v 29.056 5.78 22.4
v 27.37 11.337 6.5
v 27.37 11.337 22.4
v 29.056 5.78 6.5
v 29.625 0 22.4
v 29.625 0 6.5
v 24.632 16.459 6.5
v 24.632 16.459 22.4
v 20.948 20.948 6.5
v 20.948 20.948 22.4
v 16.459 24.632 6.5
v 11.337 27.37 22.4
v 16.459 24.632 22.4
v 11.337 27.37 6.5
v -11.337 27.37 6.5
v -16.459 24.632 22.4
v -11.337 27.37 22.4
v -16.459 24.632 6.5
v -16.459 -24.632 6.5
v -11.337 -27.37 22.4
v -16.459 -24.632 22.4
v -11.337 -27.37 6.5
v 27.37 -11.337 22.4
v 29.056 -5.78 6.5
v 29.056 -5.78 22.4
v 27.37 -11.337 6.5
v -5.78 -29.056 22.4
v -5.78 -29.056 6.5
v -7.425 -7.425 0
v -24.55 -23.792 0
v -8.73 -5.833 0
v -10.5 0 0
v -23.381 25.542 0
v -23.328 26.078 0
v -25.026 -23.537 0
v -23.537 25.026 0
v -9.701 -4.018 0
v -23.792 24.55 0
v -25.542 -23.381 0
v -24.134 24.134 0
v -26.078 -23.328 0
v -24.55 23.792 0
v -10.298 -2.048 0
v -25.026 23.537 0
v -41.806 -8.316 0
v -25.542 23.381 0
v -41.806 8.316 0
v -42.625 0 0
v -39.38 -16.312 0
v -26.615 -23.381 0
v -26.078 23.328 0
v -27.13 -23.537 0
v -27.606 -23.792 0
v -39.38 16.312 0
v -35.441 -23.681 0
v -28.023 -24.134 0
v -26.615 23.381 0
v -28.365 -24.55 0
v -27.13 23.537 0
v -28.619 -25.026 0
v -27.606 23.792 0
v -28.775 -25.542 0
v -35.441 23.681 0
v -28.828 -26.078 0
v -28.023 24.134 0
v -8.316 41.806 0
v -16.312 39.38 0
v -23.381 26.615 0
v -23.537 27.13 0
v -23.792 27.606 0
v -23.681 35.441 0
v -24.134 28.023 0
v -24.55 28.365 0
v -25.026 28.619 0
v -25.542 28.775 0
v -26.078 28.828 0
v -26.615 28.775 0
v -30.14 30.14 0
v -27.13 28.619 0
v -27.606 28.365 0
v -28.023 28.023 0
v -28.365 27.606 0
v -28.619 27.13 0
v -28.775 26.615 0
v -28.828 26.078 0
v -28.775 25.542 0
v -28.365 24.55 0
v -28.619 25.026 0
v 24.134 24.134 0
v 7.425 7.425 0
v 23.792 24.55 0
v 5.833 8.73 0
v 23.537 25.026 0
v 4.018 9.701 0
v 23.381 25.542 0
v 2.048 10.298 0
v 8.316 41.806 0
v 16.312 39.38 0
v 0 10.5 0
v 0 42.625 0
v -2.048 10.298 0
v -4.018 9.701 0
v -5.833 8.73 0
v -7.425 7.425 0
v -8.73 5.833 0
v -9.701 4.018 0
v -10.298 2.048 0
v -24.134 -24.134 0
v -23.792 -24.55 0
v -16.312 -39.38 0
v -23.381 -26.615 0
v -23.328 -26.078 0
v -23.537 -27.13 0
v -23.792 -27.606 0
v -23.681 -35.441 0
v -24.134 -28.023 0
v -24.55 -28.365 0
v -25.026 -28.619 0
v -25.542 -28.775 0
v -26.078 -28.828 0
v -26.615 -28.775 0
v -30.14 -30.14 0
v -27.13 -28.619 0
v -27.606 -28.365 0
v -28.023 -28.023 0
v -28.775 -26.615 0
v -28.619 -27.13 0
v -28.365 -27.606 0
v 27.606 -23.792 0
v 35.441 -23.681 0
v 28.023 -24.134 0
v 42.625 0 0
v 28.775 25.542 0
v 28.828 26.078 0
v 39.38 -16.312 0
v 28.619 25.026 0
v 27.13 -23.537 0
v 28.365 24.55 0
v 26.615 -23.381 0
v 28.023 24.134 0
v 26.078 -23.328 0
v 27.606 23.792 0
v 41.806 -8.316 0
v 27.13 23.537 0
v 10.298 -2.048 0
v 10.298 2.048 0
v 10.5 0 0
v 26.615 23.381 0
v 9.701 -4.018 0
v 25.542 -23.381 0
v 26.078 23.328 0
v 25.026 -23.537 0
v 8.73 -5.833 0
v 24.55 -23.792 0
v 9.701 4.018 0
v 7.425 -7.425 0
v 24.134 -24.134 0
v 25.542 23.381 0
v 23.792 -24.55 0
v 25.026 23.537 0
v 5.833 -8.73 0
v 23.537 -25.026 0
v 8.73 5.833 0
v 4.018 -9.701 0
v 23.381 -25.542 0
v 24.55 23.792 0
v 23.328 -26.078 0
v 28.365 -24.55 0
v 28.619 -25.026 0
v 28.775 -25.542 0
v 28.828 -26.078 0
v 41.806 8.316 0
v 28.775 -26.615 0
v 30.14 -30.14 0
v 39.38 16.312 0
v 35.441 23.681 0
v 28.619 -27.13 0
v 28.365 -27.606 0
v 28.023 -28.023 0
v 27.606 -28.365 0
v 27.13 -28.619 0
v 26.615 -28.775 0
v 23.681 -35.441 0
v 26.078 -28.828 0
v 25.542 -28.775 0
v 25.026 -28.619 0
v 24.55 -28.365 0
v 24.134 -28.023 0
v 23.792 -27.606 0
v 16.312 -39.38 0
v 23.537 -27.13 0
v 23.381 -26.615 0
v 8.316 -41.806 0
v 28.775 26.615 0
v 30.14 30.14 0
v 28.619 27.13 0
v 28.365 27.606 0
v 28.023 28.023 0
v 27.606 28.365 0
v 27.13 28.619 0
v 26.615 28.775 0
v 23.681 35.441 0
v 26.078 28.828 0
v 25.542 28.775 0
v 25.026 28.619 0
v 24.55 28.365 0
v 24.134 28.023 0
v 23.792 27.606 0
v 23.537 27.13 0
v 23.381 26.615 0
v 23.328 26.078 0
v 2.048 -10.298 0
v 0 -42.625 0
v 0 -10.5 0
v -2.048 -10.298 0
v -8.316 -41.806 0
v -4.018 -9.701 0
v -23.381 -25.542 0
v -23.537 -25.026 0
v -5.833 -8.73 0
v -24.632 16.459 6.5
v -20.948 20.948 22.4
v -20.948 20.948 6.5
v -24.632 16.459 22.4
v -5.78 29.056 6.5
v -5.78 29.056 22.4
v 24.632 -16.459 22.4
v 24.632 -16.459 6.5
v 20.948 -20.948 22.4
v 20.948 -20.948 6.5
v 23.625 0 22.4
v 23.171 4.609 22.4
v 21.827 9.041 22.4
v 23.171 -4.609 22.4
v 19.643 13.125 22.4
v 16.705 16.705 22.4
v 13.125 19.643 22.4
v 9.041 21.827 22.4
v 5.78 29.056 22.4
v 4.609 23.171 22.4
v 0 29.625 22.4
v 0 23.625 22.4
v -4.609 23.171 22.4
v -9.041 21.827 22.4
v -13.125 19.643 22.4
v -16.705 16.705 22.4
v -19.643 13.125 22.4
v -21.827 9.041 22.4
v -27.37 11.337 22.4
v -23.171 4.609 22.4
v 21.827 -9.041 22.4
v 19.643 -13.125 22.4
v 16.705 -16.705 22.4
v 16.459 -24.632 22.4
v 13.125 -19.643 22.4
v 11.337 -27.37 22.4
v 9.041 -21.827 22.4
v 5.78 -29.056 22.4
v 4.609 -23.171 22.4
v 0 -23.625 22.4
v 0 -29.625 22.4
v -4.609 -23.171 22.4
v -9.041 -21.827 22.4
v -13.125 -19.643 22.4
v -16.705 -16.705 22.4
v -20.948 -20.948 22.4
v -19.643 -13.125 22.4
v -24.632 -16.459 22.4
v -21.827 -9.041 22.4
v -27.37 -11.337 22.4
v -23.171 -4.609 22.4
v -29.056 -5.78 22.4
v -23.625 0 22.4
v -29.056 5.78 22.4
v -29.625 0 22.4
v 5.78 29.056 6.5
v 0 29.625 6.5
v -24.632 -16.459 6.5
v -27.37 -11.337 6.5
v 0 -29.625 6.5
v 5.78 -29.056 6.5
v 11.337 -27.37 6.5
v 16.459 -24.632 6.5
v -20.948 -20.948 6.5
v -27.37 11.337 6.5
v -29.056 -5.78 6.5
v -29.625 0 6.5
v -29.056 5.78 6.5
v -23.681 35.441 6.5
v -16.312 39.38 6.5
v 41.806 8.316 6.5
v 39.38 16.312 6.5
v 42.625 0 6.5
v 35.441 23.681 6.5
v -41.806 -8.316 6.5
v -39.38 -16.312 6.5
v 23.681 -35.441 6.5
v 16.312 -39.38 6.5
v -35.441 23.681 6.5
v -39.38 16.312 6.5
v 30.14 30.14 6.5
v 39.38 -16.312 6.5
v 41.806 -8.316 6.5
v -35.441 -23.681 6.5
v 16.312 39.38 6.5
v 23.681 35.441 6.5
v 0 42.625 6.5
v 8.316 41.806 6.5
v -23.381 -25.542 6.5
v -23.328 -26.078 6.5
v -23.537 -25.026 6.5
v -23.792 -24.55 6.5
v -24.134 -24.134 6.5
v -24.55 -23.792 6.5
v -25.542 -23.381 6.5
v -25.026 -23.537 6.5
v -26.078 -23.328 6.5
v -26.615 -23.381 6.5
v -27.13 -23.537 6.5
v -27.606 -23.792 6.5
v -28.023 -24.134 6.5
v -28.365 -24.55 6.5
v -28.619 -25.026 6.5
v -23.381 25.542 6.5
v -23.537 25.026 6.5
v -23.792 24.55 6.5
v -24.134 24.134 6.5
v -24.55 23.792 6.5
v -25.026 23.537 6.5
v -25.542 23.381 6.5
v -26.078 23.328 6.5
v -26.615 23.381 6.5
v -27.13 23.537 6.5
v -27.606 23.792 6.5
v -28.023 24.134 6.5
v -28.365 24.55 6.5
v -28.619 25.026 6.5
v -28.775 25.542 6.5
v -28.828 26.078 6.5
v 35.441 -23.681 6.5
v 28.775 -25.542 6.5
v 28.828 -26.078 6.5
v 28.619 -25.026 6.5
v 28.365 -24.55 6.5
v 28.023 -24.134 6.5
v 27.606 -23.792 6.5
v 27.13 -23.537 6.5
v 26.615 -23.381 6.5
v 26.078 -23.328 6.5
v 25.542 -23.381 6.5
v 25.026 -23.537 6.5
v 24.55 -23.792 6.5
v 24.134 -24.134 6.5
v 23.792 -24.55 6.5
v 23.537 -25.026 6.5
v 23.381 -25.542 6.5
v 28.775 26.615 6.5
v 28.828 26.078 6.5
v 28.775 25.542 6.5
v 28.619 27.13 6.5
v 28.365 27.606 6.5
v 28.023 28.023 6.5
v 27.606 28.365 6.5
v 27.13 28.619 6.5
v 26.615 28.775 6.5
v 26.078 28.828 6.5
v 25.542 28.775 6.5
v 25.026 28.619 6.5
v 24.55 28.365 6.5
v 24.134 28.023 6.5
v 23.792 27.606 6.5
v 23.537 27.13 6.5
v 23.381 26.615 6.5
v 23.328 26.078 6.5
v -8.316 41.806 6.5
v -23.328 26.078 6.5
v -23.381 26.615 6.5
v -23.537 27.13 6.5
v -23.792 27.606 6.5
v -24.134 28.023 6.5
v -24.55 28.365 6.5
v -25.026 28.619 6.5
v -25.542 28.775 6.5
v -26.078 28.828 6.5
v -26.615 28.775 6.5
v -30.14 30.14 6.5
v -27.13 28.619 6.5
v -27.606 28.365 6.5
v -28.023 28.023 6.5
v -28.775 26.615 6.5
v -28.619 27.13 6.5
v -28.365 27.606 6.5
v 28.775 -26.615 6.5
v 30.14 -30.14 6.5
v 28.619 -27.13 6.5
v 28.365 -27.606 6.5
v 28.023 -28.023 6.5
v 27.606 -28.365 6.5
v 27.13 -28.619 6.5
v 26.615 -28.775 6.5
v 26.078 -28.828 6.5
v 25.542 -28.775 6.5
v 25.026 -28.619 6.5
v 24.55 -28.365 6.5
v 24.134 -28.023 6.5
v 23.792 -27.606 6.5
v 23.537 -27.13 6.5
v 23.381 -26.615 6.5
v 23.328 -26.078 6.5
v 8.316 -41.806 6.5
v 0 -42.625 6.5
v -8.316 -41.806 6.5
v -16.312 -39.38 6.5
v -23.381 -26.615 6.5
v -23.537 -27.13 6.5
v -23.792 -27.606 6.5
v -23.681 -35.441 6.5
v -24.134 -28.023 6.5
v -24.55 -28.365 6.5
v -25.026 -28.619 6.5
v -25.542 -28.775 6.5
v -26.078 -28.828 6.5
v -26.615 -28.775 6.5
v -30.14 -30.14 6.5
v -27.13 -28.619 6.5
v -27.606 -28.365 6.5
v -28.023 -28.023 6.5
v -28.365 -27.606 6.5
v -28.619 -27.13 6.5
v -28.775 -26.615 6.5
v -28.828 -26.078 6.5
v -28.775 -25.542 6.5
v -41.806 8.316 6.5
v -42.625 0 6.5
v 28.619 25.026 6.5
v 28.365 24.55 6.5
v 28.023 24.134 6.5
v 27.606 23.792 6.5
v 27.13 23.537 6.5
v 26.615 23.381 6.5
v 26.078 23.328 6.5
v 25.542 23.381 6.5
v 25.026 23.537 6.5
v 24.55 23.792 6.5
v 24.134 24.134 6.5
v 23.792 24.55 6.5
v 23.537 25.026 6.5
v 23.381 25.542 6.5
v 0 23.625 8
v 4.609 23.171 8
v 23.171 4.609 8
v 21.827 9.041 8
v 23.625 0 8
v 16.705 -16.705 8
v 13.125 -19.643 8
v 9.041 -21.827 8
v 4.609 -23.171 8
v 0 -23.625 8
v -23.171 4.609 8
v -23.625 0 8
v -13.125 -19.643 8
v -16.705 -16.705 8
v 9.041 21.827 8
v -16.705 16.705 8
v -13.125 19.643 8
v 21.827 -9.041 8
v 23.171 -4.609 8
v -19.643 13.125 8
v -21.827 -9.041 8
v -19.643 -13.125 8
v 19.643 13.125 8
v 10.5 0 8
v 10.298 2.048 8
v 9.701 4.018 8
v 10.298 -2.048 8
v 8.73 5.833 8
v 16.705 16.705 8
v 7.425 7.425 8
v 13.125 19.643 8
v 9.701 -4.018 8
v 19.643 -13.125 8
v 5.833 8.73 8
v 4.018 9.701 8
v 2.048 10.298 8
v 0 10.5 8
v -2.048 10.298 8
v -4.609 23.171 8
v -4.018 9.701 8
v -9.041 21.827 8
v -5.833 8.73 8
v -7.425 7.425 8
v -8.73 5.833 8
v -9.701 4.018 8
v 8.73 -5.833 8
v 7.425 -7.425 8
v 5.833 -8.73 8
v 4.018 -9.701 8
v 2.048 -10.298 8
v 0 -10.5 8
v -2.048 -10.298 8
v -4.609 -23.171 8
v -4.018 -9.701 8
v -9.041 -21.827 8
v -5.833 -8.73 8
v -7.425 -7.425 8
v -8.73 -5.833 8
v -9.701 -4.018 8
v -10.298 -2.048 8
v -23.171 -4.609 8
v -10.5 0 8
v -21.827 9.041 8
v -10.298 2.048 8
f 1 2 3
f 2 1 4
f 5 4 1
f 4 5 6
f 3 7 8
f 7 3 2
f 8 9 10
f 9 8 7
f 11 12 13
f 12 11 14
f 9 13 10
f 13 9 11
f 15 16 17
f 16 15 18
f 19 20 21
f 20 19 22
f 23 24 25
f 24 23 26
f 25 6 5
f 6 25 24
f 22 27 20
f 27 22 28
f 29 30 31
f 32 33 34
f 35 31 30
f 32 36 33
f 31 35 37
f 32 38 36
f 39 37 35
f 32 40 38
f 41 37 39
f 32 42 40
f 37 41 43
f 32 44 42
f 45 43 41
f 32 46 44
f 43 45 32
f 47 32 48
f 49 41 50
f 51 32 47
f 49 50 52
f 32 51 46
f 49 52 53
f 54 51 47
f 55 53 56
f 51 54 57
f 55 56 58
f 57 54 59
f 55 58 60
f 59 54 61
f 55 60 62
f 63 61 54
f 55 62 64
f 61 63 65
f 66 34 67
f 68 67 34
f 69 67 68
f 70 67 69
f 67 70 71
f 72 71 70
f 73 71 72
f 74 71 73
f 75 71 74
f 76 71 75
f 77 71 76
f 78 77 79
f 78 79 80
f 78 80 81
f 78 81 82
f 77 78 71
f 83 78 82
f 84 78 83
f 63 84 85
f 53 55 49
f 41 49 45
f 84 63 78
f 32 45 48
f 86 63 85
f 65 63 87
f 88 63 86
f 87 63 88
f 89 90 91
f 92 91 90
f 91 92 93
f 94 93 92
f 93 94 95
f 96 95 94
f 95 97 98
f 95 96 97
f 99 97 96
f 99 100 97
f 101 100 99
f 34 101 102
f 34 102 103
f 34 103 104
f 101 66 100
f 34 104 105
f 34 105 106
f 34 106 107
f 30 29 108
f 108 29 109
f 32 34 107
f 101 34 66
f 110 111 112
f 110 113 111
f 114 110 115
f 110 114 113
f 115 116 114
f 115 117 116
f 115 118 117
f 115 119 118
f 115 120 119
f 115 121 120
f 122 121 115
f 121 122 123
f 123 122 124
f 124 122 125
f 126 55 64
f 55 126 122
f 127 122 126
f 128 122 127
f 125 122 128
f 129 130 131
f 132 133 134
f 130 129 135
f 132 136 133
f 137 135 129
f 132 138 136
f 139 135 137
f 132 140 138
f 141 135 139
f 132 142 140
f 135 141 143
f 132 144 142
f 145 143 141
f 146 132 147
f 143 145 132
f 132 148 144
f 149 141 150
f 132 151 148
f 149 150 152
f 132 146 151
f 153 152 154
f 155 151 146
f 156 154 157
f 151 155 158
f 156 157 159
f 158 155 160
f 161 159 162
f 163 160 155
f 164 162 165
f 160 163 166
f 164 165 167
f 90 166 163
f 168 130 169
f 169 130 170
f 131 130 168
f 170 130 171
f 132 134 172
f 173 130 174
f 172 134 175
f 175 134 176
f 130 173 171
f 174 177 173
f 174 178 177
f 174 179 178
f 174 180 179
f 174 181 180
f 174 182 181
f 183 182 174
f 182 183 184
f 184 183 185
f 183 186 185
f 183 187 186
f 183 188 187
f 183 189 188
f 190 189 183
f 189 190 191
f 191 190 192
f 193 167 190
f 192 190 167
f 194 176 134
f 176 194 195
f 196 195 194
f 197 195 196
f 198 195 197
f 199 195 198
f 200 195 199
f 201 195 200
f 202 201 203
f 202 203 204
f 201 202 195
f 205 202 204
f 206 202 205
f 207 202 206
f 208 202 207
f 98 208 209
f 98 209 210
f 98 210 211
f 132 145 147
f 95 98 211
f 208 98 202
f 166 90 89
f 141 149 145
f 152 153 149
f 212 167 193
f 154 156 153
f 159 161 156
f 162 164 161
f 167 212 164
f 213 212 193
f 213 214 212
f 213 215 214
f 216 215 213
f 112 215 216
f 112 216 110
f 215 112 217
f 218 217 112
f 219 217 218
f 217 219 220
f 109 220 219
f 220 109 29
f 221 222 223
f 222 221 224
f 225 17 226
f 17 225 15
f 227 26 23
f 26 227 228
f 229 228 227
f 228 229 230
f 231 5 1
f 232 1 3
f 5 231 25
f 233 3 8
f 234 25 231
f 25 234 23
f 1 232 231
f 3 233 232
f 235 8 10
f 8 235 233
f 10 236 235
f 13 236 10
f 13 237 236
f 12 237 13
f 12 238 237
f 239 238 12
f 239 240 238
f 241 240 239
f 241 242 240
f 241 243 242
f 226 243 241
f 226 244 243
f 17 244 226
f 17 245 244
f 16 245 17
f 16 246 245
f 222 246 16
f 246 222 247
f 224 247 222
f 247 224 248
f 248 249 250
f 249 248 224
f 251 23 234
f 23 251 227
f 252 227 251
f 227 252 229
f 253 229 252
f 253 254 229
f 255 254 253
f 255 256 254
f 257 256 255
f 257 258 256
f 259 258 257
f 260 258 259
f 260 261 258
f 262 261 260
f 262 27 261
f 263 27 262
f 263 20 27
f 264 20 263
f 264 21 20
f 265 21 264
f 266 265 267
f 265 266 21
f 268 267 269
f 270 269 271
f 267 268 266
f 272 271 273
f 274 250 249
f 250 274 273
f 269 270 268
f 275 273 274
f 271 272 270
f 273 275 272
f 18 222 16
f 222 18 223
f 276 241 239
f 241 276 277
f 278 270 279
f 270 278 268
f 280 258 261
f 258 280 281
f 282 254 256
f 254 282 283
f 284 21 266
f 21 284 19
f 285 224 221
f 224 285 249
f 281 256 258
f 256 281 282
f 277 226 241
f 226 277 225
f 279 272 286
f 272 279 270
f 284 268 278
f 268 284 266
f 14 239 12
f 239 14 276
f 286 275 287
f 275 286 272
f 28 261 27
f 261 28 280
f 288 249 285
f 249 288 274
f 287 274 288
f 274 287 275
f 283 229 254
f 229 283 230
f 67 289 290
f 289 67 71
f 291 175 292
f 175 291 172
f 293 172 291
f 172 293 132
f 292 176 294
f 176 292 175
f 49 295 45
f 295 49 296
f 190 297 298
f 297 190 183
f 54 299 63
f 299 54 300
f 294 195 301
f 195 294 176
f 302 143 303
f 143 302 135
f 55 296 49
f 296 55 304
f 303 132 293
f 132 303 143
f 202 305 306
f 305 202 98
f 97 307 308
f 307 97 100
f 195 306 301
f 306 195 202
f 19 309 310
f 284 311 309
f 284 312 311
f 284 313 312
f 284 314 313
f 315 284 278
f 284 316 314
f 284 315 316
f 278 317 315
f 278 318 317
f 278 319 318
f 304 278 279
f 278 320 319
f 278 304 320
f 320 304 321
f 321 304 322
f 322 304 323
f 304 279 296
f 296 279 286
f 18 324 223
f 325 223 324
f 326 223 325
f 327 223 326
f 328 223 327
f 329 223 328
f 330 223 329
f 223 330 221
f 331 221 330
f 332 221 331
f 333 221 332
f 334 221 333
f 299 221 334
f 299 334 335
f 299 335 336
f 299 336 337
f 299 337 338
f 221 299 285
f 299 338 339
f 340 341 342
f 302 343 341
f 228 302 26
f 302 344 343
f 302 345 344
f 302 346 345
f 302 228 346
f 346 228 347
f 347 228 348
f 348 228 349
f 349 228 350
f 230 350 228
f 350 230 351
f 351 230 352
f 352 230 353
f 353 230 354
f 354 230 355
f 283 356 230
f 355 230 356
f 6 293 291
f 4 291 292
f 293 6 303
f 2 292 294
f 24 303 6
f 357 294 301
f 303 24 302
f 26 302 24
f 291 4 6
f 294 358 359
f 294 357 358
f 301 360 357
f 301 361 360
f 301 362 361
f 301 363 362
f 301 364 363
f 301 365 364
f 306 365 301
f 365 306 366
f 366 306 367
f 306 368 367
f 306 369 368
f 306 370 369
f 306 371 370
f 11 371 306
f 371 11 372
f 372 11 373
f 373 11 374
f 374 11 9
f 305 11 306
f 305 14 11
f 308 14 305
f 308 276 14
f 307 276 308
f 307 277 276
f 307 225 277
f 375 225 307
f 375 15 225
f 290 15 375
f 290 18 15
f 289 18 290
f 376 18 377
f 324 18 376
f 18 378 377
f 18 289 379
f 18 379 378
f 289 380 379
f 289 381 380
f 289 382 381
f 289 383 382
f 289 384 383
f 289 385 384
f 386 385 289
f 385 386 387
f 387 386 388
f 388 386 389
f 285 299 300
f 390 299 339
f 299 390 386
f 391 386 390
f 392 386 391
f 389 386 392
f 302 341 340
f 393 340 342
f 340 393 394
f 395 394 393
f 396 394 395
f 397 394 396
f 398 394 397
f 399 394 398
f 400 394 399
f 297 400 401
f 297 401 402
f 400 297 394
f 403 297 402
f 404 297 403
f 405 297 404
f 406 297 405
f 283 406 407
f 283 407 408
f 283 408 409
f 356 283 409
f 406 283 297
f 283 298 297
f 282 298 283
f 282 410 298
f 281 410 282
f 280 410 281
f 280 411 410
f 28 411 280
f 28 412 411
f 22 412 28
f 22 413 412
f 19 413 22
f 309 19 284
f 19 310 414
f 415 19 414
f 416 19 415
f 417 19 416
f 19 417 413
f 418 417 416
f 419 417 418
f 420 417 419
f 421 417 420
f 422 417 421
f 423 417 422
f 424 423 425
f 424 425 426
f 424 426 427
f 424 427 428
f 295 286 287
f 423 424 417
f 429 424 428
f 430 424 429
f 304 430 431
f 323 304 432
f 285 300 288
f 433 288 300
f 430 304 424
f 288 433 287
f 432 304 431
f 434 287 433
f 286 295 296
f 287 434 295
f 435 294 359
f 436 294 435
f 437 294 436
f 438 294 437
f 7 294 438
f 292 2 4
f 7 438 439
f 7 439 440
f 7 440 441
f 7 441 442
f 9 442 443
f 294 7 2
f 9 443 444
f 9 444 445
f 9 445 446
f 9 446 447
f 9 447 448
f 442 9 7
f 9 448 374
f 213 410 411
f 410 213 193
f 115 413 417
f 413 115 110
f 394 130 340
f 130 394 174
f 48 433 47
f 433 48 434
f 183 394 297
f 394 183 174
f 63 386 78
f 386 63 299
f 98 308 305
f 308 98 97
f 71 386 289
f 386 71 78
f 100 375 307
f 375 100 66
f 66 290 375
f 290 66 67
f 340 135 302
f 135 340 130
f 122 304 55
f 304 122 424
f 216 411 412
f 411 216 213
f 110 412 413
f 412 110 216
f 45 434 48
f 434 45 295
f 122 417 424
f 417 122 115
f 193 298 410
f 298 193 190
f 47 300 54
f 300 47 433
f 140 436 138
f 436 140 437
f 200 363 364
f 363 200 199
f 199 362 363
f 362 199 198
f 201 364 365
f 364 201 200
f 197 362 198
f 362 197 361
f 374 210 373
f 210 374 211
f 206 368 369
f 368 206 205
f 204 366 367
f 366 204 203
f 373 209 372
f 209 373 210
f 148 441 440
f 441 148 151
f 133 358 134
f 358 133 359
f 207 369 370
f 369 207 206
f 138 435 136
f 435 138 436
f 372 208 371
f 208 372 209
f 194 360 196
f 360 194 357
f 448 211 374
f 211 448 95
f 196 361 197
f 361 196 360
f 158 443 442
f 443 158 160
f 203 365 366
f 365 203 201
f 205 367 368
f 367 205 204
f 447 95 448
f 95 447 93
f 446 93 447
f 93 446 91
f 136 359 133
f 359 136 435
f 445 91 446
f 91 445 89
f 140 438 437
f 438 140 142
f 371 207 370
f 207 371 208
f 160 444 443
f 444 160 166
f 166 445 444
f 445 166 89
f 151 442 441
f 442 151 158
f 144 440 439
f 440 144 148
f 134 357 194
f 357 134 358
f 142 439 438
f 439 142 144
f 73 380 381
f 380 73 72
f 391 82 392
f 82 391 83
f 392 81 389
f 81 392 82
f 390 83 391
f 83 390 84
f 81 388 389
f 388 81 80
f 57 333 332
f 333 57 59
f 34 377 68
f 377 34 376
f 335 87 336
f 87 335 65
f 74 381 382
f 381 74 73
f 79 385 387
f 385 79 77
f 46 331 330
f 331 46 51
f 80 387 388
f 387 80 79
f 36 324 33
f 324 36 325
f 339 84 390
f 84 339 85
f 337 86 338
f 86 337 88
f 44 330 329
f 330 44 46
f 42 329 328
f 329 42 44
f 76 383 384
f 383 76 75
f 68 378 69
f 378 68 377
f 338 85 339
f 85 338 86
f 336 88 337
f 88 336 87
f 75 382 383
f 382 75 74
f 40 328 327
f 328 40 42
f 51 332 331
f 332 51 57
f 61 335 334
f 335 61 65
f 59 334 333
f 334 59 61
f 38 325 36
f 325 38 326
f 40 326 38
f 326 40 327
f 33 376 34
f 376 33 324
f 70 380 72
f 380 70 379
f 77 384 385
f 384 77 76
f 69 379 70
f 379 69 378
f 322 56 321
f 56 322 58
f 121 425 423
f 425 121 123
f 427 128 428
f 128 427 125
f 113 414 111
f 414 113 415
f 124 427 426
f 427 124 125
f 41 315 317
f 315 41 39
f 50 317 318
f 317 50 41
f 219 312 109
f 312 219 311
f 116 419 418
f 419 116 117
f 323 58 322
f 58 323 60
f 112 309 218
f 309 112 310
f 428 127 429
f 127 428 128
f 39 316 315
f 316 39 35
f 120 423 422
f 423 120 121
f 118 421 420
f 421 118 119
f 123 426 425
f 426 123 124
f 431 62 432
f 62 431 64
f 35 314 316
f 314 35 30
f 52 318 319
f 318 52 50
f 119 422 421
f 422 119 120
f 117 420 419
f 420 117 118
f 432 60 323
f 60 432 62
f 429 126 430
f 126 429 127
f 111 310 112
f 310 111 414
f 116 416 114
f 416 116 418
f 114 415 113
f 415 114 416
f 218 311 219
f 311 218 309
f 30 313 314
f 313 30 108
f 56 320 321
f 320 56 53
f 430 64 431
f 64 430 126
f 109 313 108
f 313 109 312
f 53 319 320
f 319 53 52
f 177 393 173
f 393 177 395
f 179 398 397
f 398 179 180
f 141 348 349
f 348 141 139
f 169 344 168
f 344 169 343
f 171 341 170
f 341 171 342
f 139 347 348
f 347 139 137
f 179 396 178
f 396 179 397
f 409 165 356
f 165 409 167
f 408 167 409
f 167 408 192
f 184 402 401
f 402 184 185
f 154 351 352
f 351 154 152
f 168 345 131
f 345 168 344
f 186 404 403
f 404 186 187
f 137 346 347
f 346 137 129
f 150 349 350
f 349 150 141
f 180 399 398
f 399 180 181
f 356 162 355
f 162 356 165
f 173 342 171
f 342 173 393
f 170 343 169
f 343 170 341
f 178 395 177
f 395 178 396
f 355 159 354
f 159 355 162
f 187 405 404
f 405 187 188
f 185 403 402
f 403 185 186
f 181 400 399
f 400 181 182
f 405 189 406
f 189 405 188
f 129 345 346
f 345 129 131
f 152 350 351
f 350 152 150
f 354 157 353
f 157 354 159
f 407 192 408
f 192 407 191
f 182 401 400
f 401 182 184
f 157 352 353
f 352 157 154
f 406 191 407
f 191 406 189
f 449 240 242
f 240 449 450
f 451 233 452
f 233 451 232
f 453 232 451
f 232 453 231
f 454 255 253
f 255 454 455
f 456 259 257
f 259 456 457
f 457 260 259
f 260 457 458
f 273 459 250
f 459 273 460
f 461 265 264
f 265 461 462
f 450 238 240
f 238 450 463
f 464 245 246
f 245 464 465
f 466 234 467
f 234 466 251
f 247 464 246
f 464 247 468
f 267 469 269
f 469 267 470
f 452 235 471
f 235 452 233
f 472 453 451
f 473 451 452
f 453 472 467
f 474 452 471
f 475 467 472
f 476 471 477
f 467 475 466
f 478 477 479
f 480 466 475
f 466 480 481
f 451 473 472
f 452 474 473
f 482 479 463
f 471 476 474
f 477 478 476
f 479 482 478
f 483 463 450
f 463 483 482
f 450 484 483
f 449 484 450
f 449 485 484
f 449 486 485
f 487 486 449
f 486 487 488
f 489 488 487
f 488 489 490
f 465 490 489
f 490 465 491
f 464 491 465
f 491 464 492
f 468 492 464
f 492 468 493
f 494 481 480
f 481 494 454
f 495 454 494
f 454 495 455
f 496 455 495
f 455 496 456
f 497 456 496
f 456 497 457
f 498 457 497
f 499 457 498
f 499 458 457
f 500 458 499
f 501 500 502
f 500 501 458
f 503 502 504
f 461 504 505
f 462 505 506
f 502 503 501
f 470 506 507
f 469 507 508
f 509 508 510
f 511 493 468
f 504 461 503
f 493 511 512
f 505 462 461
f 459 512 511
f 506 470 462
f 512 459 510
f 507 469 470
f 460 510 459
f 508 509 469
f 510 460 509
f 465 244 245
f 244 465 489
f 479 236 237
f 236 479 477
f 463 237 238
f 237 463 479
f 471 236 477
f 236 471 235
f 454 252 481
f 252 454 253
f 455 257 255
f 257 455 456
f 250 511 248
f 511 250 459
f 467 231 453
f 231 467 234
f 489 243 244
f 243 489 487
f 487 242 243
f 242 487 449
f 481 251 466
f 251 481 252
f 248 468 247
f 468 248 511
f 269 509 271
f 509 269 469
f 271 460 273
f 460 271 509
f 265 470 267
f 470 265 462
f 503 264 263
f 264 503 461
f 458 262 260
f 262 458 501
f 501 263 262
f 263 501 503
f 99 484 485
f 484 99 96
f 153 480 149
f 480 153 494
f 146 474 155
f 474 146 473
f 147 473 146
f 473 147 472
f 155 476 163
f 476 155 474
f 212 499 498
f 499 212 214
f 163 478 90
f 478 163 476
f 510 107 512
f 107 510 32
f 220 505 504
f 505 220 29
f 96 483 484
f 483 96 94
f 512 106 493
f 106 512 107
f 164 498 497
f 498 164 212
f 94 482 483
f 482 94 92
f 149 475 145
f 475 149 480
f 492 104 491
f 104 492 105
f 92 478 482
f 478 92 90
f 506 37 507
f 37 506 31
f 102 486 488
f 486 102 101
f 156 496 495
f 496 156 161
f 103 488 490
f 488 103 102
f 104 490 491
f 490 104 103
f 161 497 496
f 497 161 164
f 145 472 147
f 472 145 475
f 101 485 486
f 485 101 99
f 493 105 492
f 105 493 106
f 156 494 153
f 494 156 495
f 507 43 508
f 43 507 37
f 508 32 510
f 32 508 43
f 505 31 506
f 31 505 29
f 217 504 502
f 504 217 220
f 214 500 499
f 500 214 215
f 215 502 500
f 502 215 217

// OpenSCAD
$fn = 32;

// ----------------------------------------------------------------------
// Bearing housing: seat for 6204 (47 x 14 mm), 59.25 mm body
// ----------------------------------------------------------------------

// --- parameters (mm) ---
housing_d = 59.25;        // housing outside diameter
housing_h = 22.4;         // overall housing height
wall_t = 6;               // wall thickness
seat_d = 47.25;           // 6204 seat, 0.25 mm clearance
seat_h = 14.4;            // pocket depth
shoulder = 3;             // shoulder under the bearing
pass_d = 21;              // shaft passage
flange_d = 85.25;         // mounting flange diameter
flange_t = 5;             // flange thickness
bolt_d = 5.5;             // flange bolt clearance
bolt_r = 36.88;           // flange bolt circle radius

module body() {
  cylinder(h = housing_h, d = housing_d);
}

module flange() {
  /* flange sunk 1.5 mm into the body */
  cylinder(h = flange_t + 1.5, d = flange_d);
}

difference() {
  union() {
    body();
    flange();
  }
  translate([0, 0, housing_h - seat_h]) cylinder(h = seat_h + 1, d = seat_d);
  translate([0, 0, -1]) cylinder(h = housing_h - seat_h + 1, d = pass_d);
  for (i = [0 : 3]) rotate([0, 0, 45 + i * 90]) translate([bolt_r, 0, -1])
    cylinder(h = flange_t + 3, d = bolt_d);
}
